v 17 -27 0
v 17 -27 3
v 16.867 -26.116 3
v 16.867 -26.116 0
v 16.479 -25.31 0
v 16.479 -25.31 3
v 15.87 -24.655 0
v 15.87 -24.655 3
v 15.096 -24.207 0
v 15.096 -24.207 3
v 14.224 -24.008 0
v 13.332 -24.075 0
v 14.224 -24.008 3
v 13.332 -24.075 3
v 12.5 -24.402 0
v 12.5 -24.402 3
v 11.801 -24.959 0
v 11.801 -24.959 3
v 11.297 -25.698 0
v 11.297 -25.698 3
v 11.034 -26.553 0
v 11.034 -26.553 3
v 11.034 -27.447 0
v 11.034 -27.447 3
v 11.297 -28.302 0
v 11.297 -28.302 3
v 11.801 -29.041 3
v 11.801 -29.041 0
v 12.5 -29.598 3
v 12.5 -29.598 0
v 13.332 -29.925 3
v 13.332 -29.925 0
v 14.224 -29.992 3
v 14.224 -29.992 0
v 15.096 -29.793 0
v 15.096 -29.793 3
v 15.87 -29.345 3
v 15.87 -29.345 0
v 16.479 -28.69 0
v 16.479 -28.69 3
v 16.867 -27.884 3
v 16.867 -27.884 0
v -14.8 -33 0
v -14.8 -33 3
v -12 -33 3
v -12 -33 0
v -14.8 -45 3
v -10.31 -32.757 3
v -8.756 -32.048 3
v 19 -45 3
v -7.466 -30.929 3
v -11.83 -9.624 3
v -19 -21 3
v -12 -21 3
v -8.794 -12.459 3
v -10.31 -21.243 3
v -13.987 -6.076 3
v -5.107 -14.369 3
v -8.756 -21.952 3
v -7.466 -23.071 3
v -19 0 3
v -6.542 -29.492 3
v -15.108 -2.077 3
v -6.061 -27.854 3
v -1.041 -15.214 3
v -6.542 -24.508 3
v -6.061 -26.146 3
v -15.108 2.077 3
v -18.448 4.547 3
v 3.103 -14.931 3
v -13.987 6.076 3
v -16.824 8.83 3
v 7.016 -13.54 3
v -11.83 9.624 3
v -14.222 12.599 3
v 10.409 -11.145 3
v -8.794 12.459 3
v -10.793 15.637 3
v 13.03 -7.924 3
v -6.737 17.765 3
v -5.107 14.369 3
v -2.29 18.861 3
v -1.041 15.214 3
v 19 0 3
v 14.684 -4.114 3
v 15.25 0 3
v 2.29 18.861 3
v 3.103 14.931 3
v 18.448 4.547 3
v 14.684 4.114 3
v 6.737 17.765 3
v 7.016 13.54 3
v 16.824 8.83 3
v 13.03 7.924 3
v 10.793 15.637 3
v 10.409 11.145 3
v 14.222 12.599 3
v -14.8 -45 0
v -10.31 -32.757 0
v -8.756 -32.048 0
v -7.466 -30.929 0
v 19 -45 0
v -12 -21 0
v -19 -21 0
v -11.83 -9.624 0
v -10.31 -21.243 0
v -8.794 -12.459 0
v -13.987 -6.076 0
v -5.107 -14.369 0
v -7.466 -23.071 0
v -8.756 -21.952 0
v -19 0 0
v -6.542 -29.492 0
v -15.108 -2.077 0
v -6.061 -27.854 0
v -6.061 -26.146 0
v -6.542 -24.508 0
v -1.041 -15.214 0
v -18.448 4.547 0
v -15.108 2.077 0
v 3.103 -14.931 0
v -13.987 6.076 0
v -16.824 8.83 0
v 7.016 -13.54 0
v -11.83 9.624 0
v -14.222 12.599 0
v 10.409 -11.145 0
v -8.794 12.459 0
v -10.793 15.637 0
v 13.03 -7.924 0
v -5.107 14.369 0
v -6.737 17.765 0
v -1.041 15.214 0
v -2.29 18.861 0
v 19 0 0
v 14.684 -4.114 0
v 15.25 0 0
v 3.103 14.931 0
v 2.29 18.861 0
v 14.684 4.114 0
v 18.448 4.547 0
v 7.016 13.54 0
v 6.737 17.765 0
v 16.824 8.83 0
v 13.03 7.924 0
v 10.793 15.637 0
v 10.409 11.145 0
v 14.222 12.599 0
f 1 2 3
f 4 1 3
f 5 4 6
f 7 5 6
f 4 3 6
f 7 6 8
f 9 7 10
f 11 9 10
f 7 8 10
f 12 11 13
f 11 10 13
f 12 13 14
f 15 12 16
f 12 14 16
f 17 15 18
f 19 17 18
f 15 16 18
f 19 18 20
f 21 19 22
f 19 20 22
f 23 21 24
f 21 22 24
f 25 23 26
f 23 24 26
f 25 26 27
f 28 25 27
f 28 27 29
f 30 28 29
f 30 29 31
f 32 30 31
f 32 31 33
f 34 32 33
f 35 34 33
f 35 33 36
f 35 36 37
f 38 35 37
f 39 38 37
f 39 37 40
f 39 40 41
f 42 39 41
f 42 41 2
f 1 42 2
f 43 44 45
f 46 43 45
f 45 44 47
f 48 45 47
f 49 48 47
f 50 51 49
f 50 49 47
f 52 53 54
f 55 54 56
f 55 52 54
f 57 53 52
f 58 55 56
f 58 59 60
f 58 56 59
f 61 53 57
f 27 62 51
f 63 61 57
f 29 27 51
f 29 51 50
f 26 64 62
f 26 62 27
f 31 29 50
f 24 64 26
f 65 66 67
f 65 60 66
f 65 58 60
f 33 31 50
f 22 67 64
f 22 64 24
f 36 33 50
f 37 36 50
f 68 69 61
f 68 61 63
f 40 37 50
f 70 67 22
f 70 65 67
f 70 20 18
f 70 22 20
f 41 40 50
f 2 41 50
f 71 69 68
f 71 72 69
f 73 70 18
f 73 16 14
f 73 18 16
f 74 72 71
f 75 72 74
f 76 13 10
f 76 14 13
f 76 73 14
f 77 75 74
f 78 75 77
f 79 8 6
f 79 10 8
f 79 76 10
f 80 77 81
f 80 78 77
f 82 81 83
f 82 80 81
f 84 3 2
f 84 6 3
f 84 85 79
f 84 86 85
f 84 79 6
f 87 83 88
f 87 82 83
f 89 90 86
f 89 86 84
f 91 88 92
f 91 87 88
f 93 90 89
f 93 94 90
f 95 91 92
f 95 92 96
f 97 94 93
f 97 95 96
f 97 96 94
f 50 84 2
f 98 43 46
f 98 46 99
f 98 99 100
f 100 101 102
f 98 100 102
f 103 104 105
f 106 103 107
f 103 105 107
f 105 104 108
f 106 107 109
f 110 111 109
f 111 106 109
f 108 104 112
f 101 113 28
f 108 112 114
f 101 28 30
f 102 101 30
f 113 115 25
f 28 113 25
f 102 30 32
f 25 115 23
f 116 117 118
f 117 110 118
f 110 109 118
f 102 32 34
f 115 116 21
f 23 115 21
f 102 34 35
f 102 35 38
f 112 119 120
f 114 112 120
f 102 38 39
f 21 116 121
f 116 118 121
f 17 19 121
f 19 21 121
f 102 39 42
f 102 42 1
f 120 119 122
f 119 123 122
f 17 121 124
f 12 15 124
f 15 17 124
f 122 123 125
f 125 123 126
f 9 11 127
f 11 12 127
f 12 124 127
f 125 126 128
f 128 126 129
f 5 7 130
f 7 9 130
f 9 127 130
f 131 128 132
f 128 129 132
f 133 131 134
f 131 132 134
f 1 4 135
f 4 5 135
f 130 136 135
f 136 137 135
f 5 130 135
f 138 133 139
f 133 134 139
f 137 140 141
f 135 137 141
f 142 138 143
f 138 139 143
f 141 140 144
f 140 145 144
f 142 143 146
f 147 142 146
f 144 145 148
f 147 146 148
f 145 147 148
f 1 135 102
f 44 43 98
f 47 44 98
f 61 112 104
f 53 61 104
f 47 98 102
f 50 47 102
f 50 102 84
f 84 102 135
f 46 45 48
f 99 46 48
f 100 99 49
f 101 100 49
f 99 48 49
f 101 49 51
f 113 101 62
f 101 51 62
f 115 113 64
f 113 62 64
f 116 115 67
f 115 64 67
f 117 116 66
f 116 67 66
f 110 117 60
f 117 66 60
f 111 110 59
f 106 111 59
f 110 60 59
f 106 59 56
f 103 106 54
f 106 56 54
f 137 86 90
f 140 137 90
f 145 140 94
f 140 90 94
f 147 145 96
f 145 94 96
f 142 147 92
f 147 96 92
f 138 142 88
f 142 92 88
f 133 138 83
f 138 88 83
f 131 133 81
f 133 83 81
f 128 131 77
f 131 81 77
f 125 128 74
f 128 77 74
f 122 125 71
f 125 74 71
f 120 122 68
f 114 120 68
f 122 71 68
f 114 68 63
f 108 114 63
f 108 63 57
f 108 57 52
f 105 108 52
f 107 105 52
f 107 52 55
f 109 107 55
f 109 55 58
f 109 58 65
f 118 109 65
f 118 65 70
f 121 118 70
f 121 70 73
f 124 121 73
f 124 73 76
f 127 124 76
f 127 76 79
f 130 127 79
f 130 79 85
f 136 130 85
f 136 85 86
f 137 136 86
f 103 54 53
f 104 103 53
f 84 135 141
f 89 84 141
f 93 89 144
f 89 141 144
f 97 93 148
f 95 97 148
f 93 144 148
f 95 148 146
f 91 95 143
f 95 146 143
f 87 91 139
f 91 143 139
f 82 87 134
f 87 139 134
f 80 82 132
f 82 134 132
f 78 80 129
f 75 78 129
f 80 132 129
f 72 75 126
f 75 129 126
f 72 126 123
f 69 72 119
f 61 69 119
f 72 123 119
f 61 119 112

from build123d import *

# Parameters (mm, degrees)
SKETCH1_R           = 2.5
SKETCH1_R_2         = 1.5
BOSS_EXTRUDE1_DEPTH = 3
SKETCH2_R           = 15.25
SKETCH2_R_2         = 3
CUT_EXTRUDE1_DEPTH  = 49.938737213


with BuildPart() as part:
    # Sketch1 → Boss-Extrude1 (new body)
    with BuildSketch(Plane.XY):
        with BuildLine():
            Line((-19, 0), (-19, -32))
            Line((-19, -32), (-14.8, -32))
            Line((-14.8, -32), (-14.8, -45))
            Line((-14.8, -45), (19, -45))
            Line((19, -45), (19, 0))
            ThreePointArc((19, 0), (0, 19), (-19, 0))
        make_face()
        Circle(SKETCH1_R, mode=Mode.SUBTRACT)
        with Locations((-14, -27)):
            Circle(SKETCH1_R_2, mode=Mode.SUBTRACT)
        with Locations(Location((14, -27, 0), (0, 0, 180))):
            Circle(SKETCH1_R_2, mode=Mode.SUBTRACT)
    extrude(amount=BOSS_EXTRUDE1_DEPTH)

    # Sketch2 → Cut-Extrude1 (cut, through all)
    with BuildSketch(Plane.XY.offset(3)):
        Circle(SKETCH2_R)
        with Locations((14, -27)):
            Circle(SKETCH2_R_2)
        with BuildLine():
            Line((-12, -21), (-19, -21))
            Line((-19, -21), (-19, -32))
            Line((-19, -32), (-14.8, -32))
            Line((-14.8, -32), (-14.8, -33))
            Line((-14.8, -33), (-12, -33))
            ThreePointArc((-12, -33), (-6, -27), (-12, -21))
        make_face()
    extrude(amount=-CUT_EXTRUDE1_DEPTH, mode=Mode.SUBTRACT)


solid = part.part
